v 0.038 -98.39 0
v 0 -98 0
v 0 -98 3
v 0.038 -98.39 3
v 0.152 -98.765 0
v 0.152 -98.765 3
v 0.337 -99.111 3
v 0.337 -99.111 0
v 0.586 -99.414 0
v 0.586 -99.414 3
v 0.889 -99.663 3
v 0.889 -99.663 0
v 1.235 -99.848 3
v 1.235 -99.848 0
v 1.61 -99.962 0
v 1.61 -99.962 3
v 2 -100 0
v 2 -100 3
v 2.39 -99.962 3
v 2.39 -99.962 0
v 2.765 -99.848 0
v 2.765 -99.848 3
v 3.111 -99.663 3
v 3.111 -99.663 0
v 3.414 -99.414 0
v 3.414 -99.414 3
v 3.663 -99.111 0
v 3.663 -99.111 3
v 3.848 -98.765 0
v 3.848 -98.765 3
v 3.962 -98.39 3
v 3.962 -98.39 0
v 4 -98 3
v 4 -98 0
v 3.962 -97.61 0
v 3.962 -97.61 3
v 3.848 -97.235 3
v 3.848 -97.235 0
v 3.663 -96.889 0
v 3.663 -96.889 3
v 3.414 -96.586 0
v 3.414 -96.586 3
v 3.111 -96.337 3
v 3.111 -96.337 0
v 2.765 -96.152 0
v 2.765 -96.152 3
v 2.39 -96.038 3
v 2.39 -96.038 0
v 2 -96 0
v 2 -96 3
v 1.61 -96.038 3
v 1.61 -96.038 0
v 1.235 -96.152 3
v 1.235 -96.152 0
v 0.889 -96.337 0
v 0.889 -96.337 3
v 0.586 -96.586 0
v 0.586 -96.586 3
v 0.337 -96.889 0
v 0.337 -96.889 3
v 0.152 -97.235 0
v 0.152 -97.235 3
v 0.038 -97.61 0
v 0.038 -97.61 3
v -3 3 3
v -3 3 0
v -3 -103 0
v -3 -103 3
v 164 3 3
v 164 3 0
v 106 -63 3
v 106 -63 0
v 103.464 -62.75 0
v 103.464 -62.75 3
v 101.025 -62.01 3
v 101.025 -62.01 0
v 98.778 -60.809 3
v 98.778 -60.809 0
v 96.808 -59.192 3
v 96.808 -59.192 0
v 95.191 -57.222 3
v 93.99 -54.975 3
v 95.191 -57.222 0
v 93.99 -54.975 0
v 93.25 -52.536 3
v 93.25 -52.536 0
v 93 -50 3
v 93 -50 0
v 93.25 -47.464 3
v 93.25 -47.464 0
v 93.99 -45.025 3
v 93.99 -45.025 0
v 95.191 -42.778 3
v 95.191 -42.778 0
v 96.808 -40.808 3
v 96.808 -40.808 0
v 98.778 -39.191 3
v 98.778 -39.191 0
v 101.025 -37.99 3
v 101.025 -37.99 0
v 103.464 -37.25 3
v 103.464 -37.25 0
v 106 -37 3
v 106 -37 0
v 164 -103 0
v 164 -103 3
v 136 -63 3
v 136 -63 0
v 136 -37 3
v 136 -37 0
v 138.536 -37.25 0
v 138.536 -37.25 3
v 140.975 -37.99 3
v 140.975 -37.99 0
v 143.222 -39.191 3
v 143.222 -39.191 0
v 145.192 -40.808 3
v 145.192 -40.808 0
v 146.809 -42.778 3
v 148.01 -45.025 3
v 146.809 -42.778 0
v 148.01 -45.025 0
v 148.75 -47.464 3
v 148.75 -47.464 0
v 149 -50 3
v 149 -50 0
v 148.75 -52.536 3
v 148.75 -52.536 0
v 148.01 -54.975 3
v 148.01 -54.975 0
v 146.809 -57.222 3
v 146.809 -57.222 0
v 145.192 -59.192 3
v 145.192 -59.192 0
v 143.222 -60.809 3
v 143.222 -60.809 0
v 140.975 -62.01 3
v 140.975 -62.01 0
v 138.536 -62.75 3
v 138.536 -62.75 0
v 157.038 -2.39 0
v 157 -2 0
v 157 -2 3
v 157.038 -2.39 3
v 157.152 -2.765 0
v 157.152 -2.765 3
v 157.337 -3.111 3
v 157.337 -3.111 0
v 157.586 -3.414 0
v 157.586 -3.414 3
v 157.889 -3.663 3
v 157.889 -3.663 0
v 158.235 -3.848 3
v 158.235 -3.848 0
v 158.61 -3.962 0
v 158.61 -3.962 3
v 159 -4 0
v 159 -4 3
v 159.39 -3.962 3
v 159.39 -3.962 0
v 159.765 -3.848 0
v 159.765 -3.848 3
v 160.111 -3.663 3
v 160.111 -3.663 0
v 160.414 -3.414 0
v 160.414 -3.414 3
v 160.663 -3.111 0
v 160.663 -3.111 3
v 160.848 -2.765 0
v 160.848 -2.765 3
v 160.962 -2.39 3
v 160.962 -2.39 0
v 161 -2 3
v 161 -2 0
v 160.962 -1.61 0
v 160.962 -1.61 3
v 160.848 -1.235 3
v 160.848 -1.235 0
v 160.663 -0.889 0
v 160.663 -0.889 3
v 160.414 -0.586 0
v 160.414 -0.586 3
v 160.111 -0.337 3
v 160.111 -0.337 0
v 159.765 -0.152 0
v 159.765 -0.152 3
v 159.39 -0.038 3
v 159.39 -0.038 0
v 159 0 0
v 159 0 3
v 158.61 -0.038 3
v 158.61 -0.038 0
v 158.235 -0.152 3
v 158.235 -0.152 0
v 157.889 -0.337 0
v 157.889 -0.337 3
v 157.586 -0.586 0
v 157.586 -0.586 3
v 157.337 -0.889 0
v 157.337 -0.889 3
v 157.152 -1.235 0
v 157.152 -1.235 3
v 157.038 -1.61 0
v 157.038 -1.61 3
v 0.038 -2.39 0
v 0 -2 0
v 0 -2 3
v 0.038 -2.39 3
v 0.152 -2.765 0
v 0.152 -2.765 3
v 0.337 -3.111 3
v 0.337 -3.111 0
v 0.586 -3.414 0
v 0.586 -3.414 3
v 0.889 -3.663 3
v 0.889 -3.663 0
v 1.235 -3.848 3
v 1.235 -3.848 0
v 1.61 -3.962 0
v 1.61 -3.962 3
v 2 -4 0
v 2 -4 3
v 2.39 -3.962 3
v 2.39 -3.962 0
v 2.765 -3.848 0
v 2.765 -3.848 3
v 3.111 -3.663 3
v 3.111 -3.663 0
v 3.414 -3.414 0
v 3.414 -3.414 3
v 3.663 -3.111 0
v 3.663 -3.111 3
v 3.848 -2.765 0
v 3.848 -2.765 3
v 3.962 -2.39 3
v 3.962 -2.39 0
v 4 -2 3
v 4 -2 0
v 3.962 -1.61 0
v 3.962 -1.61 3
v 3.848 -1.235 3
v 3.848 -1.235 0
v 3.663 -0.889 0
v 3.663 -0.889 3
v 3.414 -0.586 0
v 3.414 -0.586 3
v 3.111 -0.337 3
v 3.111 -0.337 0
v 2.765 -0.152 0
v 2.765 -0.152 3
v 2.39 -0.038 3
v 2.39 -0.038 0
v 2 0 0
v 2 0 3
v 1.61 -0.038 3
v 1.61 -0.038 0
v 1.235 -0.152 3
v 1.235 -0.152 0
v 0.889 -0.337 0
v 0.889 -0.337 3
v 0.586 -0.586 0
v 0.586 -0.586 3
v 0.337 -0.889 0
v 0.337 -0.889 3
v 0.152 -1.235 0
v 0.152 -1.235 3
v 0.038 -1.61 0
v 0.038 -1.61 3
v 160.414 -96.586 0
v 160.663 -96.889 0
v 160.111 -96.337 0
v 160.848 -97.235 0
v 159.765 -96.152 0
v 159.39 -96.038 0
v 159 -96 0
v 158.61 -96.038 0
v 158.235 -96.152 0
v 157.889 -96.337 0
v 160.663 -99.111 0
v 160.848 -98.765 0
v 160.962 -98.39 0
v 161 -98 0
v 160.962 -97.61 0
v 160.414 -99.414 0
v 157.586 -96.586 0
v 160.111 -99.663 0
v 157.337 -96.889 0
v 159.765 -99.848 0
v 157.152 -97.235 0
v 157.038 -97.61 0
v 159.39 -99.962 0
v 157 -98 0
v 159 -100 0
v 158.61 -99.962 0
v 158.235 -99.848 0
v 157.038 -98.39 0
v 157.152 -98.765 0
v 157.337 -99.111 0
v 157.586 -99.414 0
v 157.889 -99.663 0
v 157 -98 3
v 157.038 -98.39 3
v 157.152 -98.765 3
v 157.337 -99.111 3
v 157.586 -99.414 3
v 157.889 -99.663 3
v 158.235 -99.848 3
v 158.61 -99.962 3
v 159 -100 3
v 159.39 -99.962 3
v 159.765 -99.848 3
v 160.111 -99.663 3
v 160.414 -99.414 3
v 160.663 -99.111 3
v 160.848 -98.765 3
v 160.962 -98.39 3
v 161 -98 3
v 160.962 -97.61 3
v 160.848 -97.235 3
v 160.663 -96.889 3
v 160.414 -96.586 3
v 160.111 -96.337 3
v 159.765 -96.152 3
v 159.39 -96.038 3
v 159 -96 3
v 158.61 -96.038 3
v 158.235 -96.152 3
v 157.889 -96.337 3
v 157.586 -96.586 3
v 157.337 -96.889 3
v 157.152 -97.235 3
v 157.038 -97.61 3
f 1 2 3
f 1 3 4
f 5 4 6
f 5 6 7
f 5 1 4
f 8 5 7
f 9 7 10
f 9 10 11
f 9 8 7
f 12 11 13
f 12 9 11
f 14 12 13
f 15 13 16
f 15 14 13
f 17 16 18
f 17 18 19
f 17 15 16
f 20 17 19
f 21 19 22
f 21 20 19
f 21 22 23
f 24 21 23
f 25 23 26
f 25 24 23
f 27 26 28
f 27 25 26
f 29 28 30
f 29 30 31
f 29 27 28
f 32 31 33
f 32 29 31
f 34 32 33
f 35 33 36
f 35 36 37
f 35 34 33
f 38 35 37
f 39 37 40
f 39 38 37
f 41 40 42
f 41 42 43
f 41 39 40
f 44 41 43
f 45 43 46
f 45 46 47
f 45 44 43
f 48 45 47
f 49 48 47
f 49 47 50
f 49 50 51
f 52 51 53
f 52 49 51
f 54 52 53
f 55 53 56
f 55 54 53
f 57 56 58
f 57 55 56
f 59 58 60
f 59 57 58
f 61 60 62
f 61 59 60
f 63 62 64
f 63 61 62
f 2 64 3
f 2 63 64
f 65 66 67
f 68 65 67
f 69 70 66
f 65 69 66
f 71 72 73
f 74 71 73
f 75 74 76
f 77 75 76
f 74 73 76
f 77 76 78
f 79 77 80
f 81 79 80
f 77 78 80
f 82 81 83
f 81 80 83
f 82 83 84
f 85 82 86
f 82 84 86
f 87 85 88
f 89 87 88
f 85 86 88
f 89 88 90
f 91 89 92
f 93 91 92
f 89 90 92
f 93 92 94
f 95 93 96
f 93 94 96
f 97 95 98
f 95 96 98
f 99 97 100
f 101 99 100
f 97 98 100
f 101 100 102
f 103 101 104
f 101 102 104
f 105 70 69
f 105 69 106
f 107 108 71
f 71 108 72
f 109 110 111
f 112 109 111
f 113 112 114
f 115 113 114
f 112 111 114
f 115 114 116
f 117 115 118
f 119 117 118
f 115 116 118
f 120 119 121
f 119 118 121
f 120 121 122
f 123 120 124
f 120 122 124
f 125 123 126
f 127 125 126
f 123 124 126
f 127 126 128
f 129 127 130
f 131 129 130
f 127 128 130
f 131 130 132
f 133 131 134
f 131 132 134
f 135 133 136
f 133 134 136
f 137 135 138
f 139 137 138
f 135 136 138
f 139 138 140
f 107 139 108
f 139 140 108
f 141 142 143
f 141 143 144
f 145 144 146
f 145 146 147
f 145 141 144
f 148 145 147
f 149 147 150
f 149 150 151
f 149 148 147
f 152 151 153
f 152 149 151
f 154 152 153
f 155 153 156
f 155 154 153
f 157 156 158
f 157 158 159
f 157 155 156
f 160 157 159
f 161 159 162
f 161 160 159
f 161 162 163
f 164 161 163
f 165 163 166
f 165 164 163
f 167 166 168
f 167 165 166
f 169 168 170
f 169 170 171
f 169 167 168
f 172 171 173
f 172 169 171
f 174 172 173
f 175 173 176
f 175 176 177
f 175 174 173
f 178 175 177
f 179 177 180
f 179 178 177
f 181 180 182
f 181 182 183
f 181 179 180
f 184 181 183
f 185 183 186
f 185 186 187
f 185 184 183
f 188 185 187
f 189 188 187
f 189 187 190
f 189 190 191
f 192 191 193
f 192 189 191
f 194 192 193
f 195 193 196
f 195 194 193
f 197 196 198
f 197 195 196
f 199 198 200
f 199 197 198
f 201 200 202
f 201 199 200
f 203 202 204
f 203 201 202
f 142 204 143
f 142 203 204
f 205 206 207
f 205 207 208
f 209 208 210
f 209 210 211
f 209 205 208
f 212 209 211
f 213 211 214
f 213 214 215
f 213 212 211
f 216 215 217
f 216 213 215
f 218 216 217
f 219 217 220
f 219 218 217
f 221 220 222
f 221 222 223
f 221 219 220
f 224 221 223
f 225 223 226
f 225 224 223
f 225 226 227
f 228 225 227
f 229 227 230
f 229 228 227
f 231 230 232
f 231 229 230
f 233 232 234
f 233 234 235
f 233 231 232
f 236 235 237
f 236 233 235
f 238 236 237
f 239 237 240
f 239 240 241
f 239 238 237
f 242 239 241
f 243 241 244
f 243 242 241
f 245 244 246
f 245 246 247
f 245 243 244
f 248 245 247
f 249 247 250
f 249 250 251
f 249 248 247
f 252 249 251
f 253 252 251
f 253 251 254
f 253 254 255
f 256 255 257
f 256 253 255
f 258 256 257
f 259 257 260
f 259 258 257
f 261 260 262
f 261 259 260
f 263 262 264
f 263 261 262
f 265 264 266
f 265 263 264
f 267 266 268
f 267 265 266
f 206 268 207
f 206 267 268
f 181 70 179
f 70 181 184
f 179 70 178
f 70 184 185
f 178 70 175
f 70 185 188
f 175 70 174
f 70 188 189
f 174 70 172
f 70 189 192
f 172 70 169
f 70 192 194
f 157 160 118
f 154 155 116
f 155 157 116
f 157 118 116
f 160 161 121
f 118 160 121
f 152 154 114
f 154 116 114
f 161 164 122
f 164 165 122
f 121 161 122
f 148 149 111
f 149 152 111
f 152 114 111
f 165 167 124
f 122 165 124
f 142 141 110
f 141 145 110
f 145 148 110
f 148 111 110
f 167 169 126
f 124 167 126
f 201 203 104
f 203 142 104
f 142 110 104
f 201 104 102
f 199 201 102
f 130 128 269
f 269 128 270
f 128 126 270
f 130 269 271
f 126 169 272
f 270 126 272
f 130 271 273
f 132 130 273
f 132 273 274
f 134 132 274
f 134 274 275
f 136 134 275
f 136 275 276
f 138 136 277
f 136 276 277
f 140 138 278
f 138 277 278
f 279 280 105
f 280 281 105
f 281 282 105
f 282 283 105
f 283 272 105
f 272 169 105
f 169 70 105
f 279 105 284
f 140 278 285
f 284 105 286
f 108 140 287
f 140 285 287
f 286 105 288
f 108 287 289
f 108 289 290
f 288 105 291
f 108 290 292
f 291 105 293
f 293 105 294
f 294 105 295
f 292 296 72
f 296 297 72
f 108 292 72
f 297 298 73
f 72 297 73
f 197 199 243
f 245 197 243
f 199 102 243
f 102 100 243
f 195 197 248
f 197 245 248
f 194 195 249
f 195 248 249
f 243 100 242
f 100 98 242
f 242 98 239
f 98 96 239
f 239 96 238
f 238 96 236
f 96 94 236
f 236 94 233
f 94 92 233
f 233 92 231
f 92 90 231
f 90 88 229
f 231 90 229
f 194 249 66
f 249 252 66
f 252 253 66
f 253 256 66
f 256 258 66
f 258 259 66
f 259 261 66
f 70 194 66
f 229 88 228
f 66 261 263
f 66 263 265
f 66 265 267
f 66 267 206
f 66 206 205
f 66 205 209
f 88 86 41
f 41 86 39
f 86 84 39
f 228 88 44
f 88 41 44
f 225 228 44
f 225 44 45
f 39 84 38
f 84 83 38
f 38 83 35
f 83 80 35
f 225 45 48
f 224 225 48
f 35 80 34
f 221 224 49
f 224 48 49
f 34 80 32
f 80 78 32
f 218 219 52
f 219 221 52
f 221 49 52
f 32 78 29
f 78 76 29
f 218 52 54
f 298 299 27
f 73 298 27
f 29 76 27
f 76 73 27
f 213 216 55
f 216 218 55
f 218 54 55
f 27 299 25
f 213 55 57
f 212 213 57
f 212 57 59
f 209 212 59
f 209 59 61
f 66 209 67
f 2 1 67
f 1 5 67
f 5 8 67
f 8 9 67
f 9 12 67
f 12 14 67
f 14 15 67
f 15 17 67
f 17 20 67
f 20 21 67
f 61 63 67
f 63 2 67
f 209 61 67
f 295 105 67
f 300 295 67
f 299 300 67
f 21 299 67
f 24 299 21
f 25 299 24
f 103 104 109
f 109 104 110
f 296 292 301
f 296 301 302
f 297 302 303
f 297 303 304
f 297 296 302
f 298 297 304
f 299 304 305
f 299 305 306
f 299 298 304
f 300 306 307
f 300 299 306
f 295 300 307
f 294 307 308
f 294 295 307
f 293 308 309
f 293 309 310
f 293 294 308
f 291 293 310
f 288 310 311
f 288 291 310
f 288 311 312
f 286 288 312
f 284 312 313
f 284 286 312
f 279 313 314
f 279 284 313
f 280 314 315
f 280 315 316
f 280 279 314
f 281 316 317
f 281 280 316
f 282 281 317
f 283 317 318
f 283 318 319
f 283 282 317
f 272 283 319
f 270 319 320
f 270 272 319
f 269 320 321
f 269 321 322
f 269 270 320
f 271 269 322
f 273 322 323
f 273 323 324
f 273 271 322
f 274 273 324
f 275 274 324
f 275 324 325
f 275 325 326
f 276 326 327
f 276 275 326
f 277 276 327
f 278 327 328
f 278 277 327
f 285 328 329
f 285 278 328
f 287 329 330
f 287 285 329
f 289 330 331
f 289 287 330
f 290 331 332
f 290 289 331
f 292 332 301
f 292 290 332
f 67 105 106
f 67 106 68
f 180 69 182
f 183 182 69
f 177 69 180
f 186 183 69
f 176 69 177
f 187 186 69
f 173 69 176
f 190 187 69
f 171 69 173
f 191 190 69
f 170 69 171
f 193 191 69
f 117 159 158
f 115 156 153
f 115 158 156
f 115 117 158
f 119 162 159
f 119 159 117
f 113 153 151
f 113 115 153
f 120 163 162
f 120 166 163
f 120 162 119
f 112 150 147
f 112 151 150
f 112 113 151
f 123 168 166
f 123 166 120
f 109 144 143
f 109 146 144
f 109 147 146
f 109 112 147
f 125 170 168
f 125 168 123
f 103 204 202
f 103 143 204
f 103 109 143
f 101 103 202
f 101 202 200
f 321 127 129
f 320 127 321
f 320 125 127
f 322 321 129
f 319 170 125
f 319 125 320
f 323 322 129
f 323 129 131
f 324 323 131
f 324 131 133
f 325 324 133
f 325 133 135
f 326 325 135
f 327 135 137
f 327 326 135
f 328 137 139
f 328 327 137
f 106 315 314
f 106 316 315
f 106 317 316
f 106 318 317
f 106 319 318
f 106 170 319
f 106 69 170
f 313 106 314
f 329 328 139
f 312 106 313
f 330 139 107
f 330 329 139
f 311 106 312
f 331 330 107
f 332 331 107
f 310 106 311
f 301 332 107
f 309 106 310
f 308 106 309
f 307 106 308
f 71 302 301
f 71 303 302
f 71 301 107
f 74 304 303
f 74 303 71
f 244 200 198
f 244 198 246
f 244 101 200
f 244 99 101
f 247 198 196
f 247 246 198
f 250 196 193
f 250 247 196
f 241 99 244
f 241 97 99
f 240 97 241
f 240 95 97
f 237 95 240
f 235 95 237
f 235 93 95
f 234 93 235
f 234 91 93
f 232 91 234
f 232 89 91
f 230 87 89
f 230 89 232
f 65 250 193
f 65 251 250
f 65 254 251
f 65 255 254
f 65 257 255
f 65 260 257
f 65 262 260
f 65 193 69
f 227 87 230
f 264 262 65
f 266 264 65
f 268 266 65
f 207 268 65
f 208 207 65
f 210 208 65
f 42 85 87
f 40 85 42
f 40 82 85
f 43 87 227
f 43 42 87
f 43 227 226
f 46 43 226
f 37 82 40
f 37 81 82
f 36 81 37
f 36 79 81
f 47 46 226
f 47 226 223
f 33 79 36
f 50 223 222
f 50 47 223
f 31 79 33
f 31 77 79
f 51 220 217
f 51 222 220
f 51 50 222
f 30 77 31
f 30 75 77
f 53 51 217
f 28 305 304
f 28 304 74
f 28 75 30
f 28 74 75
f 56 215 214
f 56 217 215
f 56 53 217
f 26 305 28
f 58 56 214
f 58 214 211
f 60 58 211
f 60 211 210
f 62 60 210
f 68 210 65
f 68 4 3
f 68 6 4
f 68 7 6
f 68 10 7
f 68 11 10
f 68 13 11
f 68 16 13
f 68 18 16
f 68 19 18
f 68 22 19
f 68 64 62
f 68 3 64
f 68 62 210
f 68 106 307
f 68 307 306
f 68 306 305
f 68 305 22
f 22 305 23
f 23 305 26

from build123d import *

# Parameters (mm, degrees)
SKETCH1_W           = 167
SKETCH1_H           = 106
SKETCH1_R           = 2
BOSS_EXTRUDE1_DEPTH = 3


with BuildPart() as part:
    # Sketch1 → Boss-Extrude1 (new body)
    with BuildSketch(Plane(origin=(0, 0, 0), x_dir=(-1, 0, 0), z_dir=(0, 0, 1))):
        with Locations((-80.5, 50)):
            Rectangle(SKETCH1_W, SKETCH1_H)
        with Locations((-159, 98)):
            Circle(SKETCH1_R, mode=Mode.SUBTRACT)
        with Locations((-2, 98)):
            Circle(SKETCH1_R, mode=Mode.SUBTRACT)
        with Locations((-2, 2)):
            Circle(SKETCH1_R, mode=Mode.SUBTRACT)
        with Locations((-159, 2)):
            Circle(SKETCH1_R, mode=Mode.SUBTRACT)
        with BuildLine():
            Line((-136, 63), (-106, 63))
            ThreePointArc((-106, 63), (-93, 50), (-106, 37))
            Line((-106, 37), (-136, 37))
            ThreePointArc((-136, 37), (-149, 50), (-136, 63))
        make_face(mode=Mode.SUBTRACT)
    extrude(amount=BOSS_EXTRUDE1_DEPTH)


solid = part.part
